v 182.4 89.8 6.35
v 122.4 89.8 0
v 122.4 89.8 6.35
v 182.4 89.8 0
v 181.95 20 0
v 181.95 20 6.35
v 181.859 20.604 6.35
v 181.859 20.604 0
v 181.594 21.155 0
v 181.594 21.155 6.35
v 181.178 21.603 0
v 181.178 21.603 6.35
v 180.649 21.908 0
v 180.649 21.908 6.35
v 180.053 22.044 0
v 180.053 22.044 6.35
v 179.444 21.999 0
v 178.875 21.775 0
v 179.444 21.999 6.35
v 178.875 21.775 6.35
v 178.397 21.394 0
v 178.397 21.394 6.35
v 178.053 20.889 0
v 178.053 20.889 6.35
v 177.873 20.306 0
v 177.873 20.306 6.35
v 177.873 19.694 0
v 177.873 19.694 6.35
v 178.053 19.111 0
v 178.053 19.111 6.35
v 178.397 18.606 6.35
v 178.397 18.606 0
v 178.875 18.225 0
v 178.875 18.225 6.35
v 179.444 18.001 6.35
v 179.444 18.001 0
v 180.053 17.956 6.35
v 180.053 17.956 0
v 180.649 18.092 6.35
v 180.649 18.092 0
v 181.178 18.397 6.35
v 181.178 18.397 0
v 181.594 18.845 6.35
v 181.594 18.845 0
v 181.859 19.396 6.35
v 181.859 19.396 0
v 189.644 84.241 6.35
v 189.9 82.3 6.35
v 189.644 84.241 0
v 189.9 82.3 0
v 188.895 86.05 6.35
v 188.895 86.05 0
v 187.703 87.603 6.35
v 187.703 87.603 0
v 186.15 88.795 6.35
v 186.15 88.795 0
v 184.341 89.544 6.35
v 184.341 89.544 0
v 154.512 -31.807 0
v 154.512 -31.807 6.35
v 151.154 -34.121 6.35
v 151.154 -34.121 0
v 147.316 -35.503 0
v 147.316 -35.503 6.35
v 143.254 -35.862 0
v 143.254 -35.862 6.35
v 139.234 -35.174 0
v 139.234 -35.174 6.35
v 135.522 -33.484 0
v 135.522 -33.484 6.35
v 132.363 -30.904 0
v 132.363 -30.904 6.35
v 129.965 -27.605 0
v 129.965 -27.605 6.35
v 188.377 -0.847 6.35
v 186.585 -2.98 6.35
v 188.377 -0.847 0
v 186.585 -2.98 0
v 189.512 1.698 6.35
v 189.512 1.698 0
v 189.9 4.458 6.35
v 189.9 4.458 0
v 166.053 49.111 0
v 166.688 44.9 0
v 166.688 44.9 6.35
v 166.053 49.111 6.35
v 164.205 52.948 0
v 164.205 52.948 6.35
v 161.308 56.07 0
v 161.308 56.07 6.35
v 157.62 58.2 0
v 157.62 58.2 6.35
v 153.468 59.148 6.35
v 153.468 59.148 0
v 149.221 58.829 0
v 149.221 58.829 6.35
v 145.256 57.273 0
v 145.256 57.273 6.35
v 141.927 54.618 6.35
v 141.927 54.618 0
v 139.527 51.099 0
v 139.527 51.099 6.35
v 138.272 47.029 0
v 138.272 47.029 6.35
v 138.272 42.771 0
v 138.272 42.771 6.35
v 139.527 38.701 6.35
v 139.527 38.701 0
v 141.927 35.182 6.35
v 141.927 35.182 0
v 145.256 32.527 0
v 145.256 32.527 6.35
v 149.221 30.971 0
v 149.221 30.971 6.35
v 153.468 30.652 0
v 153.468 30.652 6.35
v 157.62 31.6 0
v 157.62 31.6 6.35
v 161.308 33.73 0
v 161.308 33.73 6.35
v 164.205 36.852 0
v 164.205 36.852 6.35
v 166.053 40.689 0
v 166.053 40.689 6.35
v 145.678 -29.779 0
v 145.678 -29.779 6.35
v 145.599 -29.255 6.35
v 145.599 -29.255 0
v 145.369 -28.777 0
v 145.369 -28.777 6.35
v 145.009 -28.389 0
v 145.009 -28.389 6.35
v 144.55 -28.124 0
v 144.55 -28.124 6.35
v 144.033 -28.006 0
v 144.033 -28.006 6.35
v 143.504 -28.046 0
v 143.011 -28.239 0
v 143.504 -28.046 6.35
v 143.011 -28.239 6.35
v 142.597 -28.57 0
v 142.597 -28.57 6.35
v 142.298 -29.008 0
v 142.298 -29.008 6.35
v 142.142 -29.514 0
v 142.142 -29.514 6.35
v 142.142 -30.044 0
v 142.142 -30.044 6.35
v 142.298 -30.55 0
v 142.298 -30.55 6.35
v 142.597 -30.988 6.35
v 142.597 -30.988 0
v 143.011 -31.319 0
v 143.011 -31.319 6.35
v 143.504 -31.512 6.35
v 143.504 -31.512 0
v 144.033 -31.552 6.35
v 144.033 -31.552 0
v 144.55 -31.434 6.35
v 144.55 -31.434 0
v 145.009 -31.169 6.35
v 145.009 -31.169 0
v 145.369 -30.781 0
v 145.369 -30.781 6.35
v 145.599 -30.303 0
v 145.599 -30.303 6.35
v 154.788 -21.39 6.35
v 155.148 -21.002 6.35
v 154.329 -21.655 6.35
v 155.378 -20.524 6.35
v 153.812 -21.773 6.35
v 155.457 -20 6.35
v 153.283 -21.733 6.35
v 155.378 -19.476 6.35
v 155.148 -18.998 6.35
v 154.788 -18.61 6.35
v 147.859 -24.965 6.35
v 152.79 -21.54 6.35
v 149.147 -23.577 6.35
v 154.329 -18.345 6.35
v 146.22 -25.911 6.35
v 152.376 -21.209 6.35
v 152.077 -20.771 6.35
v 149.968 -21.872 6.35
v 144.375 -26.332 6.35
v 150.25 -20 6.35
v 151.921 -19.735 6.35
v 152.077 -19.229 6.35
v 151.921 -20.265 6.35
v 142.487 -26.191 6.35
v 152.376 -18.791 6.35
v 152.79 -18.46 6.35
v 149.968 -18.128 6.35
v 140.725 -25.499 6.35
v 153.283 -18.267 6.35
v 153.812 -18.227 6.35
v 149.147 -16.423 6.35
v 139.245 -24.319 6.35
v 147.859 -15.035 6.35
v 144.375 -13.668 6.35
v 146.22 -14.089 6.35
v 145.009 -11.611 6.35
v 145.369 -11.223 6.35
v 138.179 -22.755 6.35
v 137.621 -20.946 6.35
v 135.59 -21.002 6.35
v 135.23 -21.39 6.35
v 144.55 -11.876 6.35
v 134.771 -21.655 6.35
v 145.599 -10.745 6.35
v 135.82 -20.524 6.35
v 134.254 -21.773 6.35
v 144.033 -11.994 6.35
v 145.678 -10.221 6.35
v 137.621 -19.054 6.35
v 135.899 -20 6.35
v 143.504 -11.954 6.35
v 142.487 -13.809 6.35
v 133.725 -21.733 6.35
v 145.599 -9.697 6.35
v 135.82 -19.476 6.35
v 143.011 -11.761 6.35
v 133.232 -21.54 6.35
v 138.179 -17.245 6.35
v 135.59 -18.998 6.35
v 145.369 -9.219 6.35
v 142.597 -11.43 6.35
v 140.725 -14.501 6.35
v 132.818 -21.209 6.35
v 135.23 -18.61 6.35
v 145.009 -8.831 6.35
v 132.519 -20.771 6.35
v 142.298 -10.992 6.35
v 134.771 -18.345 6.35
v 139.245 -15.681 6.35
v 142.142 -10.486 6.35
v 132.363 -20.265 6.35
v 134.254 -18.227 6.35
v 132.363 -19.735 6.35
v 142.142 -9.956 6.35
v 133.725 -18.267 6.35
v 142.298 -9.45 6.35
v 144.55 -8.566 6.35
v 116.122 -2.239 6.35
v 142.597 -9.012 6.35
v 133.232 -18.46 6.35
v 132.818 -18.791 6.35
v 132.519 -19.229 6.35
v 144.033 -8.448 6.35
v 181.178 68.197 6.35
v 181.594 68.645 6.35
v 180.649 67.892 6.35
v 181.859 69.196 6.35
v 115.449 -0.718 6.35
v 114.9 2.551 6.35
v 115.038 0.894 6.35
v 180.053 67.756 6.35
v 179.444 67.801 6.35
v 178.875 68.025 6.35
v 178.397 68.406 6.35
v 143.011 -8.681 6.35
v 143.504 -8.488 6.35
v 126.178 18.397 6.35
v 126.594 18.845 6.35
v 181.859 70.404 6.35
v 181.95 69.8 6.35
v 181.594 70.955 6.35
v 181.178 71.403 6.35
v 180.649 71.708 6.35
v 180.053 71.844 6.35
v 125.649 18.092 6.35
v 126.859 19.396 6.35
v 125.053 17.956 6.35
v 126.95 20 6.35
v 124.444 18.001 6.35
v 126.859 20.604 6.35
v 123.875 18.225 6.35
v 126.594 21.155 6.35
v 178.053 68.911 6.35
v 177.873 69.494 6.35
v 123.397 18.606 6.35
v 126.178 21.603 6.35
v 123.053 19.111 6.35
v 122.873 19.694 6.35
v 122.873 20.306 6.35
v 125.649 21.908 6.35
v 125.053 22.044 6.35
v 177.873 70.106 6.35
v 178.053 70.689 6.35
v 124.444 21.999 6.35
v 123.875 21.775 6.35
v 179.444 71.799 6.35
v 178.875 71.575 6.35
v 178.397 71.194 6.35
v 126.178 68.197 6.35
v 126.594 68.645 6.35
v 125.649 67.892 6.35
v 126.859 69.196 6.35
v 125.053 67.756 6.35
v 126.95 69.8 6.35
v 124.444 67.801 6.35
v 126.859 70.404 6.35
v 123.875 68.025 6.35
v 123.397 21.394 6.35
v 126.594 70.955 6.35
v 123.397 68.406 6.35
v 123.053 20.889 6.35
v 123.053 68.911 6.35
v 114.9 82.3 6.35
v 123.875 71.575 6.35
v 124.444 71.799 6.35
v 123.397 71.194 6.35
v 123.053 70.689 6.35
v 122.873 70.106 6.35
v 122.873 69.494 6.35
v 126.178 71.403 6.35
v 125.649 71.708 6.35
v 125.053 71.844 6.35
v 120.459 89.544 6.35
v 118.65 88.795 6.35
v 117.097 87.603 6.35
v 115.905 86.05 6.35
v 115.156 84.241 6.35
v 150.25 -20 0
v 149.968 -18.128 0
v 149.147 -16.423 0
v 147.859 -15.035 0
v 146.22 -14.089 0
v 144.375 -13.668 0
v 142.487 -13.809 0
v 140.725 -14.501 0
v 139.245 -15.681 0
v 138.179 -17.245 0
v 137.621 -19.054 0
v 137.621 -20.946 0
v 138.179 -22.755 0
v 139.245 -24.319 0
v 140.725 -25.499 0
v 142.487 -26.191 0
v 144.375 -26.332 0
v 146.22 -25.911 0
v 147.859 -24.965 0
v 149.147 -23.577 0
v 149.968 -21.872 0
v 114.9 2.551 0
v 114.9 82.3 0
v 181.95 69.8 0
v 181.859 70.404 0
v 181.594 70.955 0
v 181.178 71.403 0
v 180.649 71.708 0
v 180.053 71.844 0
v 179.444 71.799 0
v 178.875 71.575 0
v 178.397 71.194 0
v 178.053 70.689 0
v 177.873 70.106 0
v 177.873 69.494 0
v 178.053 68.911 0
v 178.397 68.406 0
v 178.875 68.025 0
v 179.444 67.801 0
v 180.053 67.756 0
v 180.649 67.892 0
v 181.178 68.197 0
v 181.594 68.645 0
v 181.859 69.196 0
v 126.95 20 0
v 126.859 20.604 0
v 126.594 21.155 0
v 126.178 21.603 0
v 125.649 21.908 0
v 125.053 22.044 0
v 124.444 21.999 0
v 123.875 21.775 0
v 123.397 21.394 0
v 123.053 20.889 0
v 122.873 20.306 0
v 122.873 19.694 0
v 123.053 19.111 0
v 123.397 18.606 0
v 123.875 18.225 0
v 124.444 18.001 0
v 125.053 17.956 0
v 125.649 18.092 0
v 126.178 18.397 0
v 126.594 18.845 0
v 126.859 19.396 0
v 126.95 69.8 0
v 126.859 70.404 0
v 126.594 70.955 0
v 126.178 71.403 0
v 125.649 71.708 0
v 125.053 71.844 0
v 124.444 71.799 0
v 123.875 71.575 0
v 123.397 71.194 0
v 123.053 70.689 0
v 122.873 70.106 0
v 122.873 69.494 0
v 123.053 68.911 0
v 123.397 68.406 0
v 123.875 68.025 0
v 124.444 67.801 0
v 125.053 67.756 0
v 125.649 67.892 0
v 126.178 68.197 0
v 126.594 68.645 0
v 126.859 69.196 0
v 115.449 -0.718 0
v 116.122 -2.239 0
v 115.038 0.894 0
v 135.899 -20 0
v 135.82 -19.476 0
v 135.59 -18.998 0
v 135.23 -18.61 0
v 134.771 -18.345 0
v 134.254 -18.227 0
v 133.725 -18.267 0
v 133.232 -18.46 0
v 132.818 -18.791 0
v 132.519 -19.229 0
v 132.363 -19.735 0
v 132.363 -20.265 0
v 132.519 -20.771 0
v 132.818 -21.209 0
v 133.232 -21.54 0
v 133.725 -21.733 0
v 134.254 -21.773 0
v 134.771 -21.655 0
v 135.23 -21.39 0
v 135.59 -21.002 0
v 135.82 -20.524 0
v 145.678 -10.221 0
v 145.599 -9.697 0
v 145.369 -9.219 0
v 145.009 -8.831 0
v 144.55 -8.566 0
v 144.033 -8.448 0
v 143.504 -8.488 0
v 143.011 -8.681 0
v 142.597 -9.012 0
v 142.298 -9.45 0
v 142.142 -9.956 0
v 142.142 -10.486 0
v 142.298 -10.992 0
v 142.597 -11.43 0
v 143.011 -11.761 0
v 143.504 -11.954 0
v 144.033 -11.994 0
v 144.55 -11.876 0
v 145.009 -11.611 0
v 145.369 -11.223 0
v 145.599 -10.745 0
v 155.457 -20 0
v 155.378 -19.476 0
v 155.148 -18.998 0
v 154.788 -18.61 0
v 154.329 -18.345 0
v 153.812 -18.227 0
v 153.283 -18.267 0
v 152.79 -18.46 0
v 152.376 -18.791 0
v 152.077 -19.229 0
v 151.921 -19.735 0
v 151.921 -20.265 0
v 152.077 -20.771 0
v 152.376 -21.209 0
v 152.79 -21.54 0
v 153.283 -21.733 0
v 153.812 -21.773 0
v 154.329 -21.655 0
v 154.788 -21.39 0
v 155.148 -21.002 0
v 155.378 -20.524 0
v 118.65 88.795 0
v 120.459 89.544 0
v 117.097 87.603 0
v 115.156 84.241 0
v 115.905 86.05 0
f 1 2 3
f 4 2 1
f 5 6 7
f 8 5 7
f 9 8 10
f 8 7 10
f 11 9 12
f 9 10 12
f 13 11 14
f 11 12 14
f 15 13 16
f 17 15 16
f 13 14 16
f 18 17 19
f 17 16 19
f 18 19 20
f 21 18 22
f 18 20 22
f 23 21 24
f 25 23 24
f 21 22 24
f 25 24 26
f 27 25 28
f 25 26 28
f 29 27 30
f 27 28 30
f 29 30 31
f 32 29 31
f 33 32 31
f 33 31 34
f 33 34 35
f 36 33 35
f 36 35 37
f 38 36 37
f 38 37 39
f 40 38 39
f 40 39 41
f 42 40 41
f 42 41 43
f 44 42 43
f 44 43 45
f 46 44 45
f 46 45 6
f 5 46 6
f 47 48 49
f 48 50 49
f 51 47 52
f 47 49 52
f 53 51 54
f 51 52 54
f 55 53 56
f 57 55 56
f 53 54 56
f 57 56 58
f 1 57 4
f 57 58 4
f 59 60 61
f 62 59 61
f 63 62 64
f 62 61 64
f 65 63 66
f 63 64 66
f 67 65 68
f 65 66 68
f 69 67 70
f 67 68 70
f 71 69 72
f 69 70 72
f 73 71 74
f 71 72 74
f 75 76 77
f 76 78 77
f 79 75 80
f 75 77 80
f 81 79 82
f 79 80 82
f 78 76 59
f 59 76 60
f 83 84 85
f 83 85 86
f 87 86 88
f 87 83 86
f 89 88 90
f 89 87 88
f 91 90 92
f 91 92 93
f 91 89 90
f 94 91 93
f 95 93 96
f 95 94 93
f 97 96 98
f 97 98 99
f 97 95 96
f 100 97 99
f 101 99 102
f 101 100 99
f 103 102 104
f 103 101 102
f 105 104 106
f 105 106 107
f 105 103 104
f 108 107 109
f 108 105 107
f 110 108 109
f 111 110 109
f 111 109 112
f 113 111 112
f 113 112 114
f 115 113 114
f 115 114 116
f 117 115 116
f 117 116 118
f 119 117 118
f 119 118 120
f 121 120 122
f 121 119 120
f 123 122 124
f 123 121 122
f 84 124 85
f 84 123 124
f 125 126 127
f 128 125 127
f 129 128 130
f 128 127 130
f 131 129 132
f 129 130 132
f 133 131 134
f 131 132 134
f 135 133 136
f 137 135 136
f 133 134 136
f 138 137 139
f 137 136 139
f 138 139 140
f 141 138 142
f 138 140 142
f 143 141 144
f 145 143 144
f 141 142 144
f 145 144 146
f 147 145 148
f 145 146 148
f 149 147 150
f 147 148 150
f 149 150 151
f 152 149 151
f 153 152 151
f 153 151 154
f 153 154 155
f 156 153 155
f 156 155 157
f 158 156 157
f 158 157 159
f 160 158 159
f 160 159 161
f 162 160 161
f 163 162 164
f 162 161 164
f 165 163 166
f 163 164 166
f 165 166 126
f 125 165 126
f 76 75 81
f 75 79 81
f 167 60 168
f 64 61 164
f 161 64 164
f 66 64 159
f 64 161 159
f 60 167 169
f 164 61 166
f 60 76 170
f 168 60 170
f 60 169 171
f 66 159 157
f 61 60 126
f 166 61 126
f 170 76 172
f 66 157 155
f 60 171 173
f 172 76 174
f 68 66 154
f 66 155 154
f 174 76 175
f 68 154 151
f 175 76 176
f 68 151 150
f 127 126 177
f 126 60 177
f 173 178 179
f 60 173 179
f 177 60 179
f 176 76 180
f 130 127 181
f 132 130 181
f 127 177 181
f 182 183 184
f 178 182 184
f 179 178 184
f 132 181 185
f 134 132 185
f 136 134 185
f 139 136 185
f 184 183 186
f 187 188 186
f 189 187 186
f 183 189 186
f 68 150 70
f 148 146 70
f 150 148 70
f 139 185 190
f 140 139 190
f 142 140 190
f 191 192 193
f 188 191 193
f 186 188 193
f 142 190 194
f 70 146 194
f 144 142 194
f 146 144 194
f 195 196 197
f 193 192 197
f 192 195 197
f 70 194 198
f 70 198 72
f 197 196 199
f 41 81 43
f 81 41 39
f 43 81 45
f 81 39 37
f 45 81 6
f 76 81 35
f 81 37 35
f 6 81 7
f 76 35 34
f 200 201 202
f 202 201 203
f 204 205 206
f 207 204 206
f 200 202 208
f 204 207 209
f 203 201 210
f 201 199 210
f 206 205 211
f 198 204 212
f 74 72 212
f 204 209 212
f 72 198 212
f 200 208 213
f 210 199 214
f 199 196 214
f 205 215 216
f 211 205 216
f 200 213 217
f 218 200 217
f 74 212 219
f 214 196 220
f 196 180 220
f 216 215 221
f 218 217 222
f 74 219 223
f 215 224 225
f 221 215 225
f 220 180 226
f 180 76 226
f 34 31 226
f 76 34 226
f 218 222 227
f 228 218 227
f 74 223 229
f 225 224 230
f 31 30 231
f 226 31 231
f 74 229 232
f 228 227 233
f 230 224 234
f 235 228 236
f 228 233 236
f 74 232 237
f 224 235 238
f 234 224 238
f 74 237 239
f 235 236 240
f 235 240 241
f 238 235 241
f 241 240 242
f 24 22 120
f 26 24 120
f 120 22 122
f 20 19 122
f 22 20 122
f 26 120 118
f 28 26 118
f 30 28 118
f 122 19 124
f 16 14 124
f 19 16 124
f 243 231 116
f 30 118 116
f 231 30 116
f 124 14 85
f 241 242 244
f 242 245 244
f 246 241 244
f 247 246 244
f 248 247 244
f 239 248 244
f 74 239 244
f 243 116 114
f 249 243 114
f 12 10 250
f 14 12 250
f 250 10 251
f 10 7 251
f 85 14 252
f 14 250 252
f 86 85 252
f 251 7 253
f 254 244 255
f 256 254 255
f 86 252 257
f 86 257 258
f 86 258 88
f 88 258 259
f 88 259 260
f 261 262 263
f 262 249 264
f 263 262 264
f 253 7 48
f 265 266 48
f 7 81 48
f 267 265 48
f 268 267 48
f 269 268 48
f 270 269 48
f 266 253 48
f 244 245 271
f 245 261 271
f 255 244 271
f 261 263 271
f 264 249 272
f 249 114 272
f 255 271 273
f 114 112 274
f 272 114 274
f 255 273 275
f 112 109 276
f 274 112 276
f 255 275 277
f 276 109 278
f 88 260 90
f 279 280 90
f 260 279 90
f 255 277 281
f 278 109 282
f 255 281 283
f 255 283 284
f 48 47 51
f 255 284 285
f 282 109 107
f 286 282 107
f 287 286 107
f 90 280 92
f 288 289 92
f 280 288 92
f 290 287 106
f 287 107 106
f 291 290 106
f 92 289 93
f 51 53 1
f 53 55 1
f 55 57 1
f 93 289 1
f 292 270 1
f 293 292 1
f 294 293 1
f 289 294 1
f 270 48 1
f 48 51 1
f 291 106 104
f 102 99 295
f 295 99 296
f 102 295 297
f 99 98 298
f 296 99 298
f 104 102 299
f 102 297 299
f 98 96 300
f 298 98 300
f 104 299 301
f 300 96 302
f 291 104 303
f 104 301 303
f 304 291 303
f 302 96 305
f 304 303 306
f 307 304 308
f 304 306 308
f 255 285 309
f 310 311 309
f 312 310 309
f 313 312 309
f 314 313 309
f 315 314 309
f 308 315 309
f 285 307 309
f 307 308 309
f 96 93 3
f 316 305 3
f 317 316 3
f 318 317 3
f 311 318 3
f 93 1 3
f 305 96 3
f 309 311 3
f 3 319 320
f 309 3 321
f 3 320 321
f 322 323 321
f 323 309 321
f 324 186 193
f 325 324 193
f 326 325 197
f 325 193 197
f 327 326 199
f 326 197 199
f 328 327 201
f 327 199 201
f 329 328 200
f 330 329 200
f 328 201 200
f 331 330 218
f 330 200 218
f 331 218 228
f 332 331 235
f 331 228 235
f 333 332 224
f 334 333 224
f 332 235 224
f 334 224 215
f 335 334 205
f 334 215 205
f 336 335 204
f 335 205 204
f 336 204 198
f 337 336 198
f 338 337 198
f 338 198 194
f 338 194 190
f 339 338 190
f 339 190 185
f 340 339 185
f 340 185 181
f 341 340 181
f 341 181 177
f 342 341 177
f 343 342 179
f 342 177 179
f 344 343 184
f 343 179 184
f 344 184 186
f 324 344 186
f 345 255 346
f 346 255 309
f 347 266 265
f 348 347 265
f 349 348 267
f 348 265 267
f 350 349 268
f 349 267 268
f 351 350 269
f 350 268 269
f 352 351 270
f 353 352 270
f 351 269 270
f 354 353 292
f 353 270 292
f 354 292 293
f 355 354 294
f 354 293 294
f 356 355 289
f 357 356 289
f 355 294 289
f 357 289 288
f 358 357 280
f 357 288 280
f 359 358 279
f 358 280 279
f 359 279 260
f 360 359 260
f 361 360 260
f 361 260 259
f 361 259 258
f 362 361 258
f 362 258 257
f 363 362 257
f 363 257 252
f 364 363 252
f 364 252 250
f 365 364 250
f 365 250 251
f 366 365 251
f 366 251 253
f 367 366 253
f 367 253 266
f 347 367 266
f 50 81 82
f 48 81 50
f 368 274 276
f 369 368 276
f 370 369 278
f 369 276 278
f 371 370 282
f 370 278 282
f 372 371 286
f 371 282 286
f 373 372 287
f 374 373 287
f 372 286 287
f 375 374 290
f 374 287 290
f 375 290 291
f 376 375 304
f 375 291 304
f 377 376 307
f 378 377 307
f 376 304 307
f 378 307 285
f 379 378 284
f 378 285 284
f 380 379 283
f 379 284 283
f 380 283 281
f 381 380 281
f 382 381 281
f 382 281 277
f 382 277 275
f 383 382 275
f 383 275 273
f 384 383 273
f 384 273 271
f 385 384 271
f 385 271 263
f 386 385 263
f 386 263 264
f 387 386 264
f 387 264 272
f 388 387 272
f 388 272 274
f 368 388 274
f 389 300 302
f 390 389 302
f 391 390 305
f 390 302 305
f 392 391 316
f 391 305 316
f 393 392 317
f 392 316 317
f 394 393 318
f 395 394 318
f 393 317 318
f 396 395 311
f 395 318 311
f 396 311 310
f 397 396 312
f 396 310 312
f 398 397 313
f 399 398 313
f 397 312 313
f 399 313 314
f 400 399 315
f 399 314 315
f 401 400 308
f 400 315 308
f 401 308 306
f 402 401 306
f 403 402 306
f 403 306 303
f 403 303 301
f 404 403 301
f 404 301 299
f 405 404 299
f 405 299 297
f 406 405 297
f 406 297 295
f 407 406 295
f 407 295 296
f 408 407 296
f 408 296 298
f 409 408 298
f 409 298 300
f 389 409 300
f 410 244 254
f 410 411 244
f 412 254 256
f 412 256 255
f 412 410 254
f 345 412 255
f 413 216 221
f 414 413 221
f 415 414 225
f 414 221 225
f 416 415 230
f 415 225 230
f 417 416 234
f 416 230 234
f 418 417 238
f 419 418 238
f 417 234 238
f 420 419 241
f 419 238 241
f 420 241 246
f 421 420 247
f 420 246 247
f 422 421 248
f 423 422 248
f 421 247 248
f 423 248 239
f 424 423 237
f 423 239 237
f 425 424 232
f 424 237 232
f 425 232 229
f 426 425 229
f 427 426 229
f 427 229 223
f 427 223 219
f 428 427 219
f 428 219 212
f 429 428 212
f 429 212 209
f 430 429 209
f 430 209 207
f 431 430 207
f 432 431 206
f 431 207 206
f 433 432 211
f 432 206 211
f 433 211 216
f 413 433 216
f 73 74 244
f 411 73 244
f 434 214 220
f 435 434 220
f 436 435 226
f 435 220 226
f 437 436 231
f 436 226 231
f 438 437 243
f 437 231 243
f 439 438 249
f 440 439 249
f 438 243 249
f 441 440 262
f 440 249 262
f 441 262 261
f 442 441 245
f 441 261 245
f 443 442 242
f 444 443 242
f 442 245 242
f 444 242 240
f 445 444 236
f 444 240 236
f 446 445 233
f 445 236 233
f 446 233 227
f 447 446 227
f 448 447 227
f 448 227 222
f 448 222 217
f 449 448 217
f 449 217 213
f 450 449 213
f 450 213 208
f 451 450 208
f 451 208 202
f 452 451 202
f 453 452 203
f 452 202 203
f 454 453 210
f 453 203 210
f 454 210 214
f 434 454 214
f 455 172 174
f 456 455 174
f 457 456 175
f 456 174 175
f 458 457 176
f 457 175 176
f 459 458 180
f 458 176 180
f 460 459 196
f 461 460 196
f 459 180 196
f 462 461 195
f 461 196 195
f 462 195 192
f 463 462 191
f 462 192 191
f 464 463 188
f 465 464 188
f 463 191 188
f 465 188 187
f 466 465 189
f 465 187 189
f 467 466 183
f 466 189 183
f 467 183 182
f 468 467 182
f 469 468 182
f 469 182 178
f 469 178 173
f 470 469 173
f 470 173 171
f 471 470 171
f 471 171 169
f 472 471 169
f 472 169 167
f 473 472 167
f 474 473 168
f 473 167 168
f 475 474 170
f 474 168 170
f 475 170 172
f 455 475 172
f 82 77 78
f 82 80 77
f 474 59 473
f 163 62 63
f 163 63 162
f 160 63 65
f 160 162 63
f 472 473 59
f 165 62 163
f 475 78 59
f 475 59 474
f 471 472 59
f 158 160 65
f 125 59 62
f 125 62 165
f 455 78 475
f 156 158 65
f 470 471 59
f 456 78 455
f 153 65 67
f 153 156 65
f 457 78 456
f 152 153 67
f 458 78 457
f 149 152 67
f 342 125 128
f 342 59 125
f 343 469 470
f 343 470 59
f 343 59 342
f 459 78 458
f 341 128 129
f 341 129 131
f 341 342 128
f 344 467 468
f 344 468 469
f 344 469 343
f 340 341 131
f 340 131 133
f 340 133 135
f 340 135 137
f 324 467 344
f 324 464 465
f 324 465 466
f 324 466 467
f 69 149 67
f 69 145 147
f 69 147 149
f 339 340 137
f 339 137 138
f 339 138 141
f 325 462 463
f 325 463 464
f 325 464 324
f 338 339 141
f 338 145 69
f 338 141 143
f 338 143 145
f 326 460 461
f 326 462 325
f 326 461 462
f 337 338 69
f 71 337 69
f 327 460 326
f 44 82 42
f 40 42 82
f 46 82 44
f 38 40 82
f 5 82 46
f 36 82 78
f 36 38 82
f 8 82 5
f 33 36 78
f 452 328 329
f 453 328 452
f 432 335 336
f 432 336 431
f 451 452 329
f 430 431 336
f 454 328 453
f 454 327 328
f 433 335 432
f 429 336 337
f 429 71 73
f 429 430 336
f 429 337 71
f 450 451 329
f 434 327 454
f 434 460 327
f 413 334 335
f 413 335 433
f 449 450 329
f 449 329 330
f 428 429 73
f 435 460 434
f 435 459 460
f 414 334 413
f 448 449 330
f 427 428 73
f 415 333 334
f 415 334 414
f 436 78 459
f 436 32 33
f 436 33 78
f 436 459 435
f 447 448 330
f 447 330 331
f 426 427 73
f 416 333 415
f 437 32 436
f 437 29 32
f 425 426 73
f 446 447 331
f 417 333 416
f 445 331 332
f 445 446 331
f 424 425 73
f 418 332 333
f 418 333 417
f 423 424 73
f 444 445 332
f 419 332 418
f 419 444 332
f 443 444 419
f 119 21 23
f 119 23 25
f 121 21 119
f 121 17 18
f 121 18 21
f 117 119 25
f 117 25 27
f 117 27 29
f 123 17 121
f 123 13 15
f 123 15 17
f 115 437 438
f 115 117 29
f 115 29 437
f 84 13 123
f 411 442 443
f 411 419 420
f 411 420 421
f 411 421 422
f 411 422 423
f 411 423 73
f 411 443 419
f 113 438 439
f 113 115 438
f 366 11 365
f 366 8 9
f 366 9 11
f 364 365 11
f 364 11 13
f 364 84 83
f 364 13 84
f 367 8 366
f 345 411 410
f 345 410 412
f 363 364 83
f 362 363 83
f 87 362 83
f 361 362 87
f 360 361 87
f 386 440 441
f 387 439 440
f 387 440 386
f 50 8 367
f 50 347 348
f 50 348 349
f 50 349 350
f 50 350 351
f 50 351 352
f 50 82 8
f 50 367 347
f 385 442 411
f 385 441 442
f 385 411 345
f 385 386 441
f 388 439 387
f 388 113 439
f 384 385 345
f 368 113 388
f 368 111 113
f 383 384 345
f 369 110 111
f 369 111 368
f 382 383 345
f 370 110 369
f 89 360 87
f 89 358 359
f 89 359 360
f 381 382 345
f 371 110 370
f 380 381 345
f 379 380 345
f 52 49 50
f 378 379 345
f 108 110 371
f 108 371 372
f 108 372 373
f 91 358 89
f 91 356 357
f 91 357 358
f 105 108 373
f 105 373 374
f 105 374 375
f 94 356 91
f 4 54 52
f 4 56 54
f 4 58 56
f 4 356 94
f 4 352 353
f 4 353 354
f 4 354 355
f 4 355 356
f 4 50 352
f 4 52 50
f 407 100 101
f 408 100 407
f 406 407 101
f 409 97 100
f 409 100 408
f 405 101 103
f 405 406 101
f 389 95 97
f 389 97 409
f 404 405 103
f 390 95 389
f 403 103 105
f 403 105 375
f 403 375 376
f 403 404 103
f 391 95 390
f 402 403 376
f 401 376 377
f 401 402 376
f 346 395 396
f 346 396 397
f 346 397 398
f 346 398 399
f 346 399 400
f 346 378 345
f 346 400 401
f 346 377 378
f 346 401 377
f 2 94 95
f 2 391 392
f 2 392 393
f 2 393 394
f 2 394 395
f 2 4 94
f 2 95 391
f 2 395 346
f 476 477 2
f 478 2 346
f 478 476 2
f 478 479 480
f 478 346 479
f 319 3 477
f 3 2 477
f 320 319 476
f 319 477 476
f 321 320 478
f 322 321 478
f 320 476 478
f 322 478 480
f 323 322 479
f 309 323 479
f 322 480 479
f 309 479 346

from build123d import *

# Parameters (mm, degrees)
SKETCH1_W           = 304.8
SKETCH1_H           = 89.8
SKETCH1_R           = 14.2875
SKETCH1_R_2         = 2.54
SKETCH1_R_3         = 17.145
BOSS_EXTRUDE1_DEPTH = 6.35
SKETCH2_W           = 114.9
SKETCH2_H           = 89.8
SKETCH2_R           = 2.54
SKETCH2_R_2         = 17.145
CUT_EXTRUDE1_DEPTH  = 10
SKETCH4_R           = 6.35
SKETCH4_R_2         = 1.778
BOSS_EXTRUDE2_DEPTH = 6.35
FILLET1_R           = 10
FILLET2_R           = 7.5
SKETCH7_R           = 2.05
CUT_EXTRUDE2_DEPTH  = 10


with BuildPart() as part:
    # Sketch1 → Boss-Extrude1 (new body)
    with BuildSketch(Plane.XY):
        with Locations((152.4, 44.9)):
            Rectangle(SKETCH1_W, SKETCH1_H)
        with Locations((152.4, 44.9)):
            Circle(SKETCH1_R, mode=Mode.SUBTRACT)
        with Locations((109.401585406, 62.859439014)):
            Circle(SKETCH1_R_2, mode=Mode.SUBTRACT)
        with Locations((109.399439014, 26.938414594)):
            Circle(SKETCH1_R_2, mode=Mode.SUBTRACT)
        with Locations((73.478414594, 26.940560986)):
            Circle(SKETCH1_R_2, mode=Mode.SUBTRACT)
        with Locations((73.480560986, 62.861585406)):
            Circle(SKETCH1_R_2, mode=Mode.SUBTRACT)
        with Locations((91.44, 44.9)):
            Circle(SKETCH1_R_3, mode=Mode.SUBTRACT)
        with Locations((195.400560986, 62.861585406)):
            Circle(SKETCH1_R_2, mode=Mode.SUBTRACT)
        with Locations((231.321585406, 62.859439014)):
            Circle(SKETCH1_R_2, mode=Mode.SUBTRACT)
        with Locations((231.319439014, 26.938414594)):
            Circle(SKETCH1_R_2, mode=Mode.SUBTRACT)
        with Locations((195.398414594, 26.940560986)):
            Circle(SKETCH1_R_2, mode=Mode.SUBTRACT)
        with Locations((213.36, 44.9)):
            Circle(SKETCH1_R_3, mode=Mode.SUBTRACT)
    extrude(amount=BOSS_EXTRUDE1_DEPTH)

    # Sketch2 → Cut-Extrude1 (cut)
    with BuildSketch(Plane.XY.offset(6.35)):
        with Locations((247.35, 44.9)):
            Rectangle(SKETCH2_W, SKETCH2_H)
        with Locations((195.398414594, 26.940560986)):
            Circle(SKETCH2_R, mode=Mode.SUBTRACT)
        with Locations((231.319439014, 26.938414594)):
            Circle(SKETCH2_R, mode=Mode.SUBTRACT)
        with Locations((213.36, 44.9)):
            Circle(SKETCH2_R_2, mode=Mode.SUBTRACT)
        with Locations((195.400560986, 62.861585406)):
            Circle(SKETCH2_R, mode=Mode.SUBTRACT)
        with Locations((231.321585406, 62.859439014)):
            Circle(SKETCH2_R, mode=Mode.SUBTRACT)
        with Locations((57.45, 44.9)):
            Rectangle(SKETCH2_W, SKETCH2_H)
        with Locations((73.478414594, 26.940560986)):
            Circle(SKETCH2_R, mode=Mode.SUBTRACT)
        with Locations((109.399439014, 26.938414594)):
            Circle(SKETCH2_R, mode=Mode.SUBTRACT)
        with Locations((91.44, 44.9)):
            Circle(SKETCH2_R_2, mode=Mode.SUBTRACT)
        with Locations((73.480560986, 62.861585406)):
            Circle(SKETCH2_R, mode=Mode.SUBTRACT)
        with Locations((109.401585406, 62.859439014)):
            Circle(SKETCH2_R, mode=Mode.SUBTRACT)
    extrude(amount=-CUT_EXTRUDE1_DEPTH, mode=Mode.SUBTRACT)

    # Sketch4 → Boss-Extrude2 (add)
    with BuildSketch(Plane.XY.offset(6.35)):
        with BuildLine():
            Line((189.9, 0), (154.512001483, -31.80682216))
            ThreePointArc((154.512001483, -31.80682216), (141.221457874, -35.647397134), (129.96508312, -27.604848226))
            Line((129.96508312, -27.604848226), (114.9, 0))
            Line((114.9, 0), (189.9, 0))
        make_face()
        with Locations((143.9, -20)):
            Circle(SKETCH4_R, mode=Mode.SUBTRACT)
        with Locations((143.9, -29.779)):
            Circle(SKETCH4_R_2, mode=Mode.SUBTRACT)
        with Locations((134.121, -20)):
            Circle(SKETCH4_R_2, mode=Mode.SUBTRACT)
        with Locations((153.679, -20)):
            Circle(SKETCH4_R_2, mode=Mode.SUBTRACT)
        with Locations((143.9, -10.221)):
            Circle(SKETCH4_R_2, mode=Mode.SUBTRACT)
    extrude(amount=-BOSS_EXTRUDE2_DEPTH)

    # Fillet1
    fillet1_edges = [part.edges().sort_by_distance(p)[0] for p in [
        (189.9, 0, 3.175),
        (114.9, 0, 3.175),
    ]]
    fillet(fillet1_edges, radius=FILLET1_R)

    # Fillet2
    fillet2_edges = [part.edges().sort_by_distance(p)[0] for p in [
        (114.9, 89.8, 3.175),
        (189.9, 89.8, 3.175),
    ]]
    fillet(fillet2_edges, radius=FILLET2_R)

    # Sketch7 → Cut-Extrude2 (cut)
    with BuildSketch(Plane.XY.offset(6.35)):
        with Locations((179.9, 69.8)):
            Circle(SKETCH7_R)
        with Locations((124.9, 69.8)):
            Circle(SKETCH7_R)
        with Locations((124.9, 20)):
            Circle(SKETCH7_R)
        with Locations((179.9, 20)):
            Circle(SKETCH7_R)
    extrude(amount=-CUT_EXTRUDE2_DEPTH, mode=Mode.SUBTRACT)


solid = part.part
